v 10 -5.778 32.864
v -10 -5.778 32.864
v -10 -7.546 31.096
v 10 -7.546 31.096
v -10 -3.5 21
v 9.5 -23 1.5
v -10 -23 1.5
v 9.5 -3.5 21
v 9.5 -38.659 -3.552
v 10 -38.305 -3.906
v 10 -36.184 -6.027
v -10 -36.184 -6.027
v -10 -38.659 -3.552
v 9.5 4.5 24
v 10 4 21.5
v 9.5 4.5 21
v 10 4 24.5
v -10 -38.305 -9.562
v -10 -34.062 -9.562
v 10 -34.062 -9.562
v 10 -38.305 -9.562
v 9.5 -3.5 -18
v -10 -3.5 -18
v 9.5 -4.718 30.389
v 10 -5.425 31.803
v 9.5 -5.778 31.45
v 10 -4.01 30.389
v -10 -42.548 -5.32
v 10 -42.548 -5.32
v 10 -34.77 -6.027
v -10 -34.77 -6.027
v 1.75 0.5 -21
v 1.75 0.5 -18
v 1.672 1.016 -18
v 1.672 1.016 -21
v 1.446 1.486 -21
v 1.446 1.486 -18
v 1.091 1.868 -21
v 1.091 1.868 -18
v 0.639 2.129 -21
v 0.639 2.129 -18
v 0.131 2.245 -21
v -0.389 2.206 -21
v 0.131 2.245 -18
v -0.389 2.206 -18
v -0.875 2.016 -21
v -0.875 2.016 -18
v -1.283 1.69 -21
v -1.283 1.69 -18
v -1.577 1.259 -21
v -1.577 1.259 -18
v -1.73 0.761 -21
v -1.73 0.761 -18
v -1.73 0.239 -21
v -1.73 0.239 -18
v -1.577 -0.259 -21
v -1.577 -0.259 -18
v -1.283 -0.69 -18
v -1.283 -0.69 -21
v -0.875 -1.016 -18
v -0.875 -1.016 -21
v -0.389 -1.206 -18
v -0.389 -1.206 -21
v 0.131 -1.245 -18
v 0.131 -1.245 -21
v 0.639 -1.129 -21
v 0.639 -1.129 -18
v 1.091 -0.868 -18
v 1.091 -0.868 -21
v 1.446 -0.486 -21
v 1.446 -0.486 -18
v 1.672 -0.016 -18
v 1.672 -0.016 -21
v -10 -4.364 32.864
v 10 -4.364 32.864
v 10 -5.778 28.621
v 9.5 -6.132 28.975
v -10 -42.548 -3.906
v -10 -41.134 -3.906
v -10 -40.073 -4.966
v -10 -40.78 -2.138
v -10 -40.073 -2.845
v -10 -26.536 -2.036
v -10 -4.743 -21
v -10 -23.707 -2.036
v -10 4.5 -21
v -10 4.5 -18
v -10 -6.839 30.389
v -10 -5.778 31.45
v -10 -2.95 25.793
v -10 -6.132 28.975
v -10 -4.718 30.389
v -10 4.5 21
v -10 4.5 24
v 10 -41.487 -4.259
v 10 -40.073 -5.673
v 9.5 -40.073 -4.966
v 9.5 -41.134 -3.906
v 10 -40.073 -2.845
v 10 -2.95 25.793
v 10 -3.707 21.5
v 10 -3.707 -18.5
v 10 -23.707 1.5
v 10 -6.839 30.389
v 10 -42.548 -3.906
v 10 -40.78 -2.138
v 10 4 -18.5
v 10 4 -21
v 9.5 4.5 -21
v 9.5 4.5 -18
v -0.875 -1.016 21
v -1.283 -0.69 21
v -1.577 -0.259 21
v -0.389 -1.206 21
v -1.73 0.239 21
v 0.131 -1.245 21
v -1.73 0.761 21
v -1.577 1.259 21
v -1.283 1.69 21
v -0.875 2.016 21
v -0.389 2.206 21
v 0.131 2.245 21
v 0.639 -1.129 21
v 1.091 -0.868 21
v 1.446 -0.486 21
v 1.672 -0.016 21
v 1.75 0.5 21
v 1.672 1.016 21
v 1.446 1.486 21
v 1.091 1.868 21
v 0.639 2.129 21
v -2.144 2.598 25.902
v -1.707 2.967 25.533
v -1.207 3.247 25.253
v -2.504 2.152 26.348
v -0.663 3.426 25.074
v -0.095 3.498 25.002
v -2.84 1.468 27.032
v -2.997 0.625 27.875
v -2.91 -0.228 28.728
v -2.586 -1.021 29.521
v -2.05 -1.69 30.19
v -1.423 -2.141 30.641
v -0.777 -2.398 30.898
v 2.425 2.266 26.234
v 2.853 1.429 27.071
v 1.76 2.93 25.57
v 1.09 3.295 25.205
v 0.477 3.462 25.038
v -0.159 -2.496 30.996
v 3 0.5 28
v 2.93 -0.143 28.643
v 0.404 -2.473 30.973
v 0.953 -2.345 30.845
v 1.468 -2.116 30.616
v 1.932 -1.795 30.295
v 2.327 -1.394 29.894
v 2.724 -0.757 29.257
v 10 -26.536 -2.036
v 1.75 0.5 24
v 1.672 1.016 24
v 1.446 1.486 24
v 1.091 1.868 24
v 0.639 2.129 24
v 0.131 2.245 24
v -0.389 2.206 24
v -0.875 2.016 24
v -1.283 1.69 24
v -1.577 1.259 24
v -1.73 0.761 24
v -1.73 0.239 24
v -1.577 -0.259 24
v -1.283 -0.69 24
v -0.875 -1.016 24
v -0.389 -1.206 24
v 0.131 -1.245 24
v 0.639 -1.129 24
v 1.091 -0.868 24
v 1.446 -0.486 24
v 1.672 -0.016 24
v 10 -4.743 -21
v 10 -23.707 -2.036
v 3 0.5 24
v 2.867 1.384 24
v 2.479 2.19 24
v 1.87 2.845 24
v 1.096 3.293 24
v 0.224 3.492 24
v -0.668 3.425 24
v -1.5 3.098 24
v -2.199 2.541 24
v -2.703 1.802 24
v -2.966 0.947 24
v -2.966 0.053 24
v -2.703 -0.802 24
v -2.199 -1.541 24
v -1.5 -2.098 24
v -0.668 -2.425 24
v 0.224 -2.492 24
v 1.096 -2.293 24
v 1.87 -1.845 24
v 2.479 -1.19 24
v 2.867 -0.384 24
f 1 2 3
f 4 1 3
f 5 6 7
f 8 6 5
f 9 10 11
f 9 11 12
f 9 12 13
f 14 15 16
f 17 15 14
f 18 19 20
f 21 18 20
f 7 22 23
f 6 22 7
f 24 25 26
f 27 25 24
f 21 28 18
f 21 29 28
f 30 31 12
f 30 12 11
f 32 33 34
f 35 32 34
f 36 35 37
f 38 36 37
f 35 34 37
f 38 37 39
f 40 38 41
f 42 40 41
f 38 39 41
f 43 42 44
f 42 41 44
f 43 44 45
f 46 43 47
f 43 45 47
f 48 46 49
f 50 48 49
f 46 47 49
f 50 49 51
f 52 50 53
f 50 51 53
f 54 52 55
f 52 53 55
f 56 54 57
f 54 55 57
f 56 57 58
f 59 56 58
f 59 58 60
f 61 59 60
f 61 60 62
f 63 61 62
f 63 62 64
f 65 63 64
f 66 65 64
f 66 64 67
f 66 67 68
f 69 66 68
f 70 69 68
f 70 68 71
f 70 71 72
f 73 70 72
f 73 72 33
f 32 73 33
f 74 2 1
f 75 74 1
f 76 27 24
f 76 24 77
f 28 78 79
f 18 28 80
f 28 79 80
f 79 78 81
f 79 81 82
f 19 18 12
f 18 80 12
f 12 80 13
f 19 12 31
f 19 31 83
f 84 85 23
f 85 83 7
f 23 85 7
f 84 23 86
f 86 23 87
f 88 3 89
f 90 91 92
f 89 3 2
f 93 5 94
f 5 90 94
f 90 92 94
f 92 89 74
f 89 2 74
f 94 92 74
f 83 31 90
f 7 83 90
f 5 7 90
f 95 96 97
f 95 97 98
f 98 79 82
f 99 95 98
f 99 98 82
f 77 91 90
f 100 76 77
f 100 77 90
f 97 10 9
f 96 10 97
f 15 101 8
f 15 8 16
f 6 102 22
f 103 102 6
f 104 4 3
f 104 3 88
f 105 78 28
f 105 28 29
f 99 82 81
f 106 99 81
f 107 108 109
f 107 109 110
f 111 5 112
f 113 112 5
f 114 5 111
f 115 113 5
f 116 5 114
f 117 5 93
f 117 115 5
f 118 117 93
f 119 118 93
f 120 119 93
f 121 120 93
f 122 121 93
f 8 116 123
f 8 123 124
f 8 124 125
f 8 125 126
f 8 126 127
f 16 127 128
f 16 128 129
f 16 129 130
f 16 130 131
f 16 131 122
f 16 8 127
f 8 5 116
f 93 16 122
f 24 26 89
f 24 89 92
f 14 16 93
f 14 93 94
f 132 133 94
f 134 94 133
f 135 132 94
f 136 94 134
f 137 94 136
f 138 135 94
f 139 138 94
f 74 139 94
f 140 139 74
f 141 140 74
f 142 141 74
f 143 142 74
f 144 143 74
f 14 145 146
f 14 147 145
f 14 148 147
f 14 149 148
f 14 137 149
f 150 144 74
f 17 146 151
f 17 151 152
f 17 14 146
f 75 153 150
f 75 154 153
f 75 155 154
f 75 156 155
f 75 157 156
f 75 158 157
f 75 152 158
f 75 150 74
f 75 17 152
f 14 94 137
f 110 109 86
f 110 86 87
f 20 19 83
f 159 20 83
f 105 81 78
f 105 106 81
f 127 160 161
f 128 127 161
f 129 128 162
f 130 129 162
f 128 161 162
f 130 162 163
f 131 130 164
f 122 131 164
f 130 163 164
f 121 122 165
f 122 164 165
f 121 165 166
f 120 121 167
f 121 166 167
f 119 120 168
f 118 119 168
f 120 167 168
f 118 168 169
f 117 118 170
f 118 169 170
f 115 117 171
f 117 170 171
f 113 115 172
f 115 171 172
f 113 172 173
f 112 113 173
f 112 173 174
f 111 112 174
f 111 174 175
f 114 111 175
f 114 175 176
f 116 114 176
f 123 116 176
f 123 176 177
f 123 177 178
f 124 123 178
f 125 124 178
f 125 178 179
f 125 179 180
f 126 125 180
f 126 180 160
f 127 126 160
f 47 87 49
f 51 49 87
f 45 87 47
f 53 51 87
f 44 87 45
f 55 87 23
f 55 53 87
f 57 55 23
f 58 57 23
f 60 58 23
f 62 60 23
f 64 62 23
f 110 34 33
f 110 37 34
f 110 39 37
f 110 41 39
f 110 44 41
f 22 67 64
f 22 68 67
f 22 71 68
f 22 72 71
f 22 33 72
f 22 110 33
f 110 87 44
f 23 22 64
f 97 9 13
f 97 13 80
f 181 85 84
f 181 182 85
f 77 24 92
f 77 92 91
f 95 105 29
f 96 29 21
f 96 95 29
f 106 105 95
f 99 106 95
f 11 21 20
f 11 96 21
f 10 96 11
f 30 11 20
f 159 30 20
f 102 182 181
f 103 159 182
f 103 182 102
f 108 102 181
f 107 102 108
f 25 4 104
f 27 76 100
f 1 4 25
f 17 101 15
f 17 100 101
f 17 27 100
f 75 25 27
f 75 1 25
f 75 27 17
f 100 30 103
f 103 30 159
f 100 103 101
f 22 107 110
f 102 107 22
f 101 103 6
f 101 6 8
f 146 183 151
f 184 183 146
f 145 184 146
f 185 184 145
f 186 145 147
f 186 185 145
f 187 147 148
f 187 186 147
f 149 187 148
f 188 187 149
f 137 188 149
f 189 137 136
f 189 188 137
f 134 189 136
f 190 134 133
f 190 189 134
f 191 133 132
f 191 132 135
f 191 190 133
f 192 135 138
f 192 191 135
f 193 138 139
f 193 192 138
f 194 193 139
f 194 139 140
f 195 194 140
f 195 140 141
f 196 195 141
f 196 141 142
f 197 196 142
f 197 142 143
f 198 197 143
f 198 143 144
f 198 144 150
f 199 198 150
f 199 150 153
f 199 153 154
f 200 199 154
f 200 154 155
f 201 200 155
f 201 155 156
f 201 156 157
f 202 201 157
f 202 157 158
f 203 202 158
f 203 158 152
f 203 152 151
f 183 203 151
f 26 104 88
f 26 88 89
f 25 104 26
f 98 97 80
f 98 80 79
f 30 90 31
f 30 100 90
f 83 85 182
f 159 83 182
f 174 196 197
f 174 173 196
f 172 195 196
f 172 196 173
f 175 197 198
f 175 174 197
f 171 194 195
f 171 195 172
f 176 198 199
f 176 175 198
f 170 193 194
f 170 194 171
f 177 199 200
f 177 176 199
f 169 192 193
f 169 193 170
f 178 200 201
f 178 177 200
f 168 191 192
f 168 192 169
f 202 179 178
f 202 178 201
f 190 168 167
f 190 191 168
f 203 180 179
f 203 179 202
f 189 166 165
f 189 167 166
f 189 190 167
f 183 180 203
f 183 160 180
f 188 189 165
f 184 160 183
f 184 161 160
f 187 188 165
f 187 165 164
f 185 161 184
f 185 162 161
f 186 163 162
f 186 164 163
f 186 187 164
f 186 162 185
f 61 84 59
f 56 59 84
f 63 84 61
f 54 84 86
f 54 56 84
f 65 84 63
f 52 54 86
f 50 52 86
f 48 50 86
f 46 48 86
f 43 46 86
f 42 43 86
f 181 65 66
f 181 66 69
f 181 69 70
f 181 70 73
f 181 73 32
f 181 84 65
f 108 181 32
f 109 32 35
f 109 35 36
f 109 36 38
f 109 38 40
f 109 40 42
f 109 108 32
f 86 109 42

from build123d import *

# Parameters (mm, degrees)
CYLINDER004_R     = 3
CYLINDER004_DEPTH = 10
PAD010_DEPTH      = 10
SKETCH036_R       = 1.75
POCKET025_DEPTH   = 45.001
CHAMFER023_1_SIZE = 3
CHAMFER023_2_SIZE = 2
CHAMFER023_3_SIZE = 1
CHAMFER024_SIZE   = 0.5


with BuildPart() as boardbracketscrewheadcylinder001:
    # Cylinder004 → Cylinder004 (new body)
    with BuildSketch(Plane(origin=(0, 0.5, 24), x_dir=(1, 0, 0), z_dir=(0, 0, 1))):
        Circle(CYLINDER004_R)
    extrude(amount=CYLINDER004_DEPTH)


with BuildPart() as escornacpuprintingchamfer024_final:
    # Sketch035 → Pad010 (new body, symmetric)
    with BuildSketch(Plane.YZ):
        Polygon((4.5, 21), (4.5, 24), (-0.12132, 28.62132), (-5.071068, 33.571068), (-7.545942, 31.096194), (-6.838835, 30.389087), (-5.778175, 31.449747), (-4.717514, 30.389087), (-6.131728, 28.974874), (-2.949747, 25.792893), (-35.476659, -6.734019), (-38.65864, -3.552038), (-40.072853, -4.966252), (-41.133514, -3.905592), (-40.072853, -2.844931), (-40.77996, -2.137825), (-43.254834, -4.612698), (-38.305087, -9.562446), (-36.183766, -11.683766), (-25.12132, -0.62132), (-4.742641, -21), (4.5, -21), (4.5, -18), (-3.5, -18), (-23, 1.5), (-3.5, 21), align=None)
    extrude(amount=PAD010_DEPTH, both=True)

    # Cut002: cut BoardBracketScrewHeadCylinder001
    add(boardbracketscrewheadcylinder001.part, mode=Mode.SUBTRACT)

    # Sketch036 → Pocket025 (cut, through all)
    with BuildSketch(Plane.XY.offset(24)):
        with Locations((0, 0.5)):
            Circle(SKETCH036_R)
    extrude(amount=-POCKET025_DEPTH, mode=Mode.SUBTRACT)

    # Chamfer023 1
    chamfer023_1_edges = [escornacpuprintingchamfer024_final.edges().sort_by_distance(p)[0] for p in [
        (0, -36.183766, -11.683766),
    ]]
    chamfer(chamfer023_1_edges, length=CHAMFER023_1_SIZE)

    # Chamfer023 2
    chamfer023_2_edges = [escornacpuprintingchamfer024_final.edges().sort_by_distance(p)[0] for p in [
        (0, -25.12132, -0.62132),
    ]]
    chamfer(chamfer023_2_edges, length=CHAMFER023_2_SIZE)

    # Chamfer023 3
    chamfer023_3_edges = [escornacpuprintingchamfer024_final.edges().sort_by_distance(p)[0] for p in [
        (0, -35.476659, -6.734019),
        (0, -43.254834, -4.612698),
        (0, -5.071068, 33.571068),
    ]]
    chamfer(chamfer023_3_edges, length=CHAMFER023_3_SIZE)

    # Chamfer024
    chamfer024_edges = [escornacpuprintingchamfer024_final.edges().sort_by_distance(p)[0] for p in [
        (10, -5.424621, 29.681981),
        (10, -39.365747, -4.259145),
        (10, -5.247845, 30.919417),
        (10, -40.603184, -4.435922),
        (10, 4.5, 22.5),
        (10, 0.5, 21),
        (10, -13.25, 11.25),
        (10, -13.25, -8.25),
        (10, 0.5, -18),
        (10, 4.5, -19.5),
    ]]
    chamfer(chamfer024_edges, length=CHAMFER024_SIZE)


solid = escornacpuprintingchamfer024_final.part
